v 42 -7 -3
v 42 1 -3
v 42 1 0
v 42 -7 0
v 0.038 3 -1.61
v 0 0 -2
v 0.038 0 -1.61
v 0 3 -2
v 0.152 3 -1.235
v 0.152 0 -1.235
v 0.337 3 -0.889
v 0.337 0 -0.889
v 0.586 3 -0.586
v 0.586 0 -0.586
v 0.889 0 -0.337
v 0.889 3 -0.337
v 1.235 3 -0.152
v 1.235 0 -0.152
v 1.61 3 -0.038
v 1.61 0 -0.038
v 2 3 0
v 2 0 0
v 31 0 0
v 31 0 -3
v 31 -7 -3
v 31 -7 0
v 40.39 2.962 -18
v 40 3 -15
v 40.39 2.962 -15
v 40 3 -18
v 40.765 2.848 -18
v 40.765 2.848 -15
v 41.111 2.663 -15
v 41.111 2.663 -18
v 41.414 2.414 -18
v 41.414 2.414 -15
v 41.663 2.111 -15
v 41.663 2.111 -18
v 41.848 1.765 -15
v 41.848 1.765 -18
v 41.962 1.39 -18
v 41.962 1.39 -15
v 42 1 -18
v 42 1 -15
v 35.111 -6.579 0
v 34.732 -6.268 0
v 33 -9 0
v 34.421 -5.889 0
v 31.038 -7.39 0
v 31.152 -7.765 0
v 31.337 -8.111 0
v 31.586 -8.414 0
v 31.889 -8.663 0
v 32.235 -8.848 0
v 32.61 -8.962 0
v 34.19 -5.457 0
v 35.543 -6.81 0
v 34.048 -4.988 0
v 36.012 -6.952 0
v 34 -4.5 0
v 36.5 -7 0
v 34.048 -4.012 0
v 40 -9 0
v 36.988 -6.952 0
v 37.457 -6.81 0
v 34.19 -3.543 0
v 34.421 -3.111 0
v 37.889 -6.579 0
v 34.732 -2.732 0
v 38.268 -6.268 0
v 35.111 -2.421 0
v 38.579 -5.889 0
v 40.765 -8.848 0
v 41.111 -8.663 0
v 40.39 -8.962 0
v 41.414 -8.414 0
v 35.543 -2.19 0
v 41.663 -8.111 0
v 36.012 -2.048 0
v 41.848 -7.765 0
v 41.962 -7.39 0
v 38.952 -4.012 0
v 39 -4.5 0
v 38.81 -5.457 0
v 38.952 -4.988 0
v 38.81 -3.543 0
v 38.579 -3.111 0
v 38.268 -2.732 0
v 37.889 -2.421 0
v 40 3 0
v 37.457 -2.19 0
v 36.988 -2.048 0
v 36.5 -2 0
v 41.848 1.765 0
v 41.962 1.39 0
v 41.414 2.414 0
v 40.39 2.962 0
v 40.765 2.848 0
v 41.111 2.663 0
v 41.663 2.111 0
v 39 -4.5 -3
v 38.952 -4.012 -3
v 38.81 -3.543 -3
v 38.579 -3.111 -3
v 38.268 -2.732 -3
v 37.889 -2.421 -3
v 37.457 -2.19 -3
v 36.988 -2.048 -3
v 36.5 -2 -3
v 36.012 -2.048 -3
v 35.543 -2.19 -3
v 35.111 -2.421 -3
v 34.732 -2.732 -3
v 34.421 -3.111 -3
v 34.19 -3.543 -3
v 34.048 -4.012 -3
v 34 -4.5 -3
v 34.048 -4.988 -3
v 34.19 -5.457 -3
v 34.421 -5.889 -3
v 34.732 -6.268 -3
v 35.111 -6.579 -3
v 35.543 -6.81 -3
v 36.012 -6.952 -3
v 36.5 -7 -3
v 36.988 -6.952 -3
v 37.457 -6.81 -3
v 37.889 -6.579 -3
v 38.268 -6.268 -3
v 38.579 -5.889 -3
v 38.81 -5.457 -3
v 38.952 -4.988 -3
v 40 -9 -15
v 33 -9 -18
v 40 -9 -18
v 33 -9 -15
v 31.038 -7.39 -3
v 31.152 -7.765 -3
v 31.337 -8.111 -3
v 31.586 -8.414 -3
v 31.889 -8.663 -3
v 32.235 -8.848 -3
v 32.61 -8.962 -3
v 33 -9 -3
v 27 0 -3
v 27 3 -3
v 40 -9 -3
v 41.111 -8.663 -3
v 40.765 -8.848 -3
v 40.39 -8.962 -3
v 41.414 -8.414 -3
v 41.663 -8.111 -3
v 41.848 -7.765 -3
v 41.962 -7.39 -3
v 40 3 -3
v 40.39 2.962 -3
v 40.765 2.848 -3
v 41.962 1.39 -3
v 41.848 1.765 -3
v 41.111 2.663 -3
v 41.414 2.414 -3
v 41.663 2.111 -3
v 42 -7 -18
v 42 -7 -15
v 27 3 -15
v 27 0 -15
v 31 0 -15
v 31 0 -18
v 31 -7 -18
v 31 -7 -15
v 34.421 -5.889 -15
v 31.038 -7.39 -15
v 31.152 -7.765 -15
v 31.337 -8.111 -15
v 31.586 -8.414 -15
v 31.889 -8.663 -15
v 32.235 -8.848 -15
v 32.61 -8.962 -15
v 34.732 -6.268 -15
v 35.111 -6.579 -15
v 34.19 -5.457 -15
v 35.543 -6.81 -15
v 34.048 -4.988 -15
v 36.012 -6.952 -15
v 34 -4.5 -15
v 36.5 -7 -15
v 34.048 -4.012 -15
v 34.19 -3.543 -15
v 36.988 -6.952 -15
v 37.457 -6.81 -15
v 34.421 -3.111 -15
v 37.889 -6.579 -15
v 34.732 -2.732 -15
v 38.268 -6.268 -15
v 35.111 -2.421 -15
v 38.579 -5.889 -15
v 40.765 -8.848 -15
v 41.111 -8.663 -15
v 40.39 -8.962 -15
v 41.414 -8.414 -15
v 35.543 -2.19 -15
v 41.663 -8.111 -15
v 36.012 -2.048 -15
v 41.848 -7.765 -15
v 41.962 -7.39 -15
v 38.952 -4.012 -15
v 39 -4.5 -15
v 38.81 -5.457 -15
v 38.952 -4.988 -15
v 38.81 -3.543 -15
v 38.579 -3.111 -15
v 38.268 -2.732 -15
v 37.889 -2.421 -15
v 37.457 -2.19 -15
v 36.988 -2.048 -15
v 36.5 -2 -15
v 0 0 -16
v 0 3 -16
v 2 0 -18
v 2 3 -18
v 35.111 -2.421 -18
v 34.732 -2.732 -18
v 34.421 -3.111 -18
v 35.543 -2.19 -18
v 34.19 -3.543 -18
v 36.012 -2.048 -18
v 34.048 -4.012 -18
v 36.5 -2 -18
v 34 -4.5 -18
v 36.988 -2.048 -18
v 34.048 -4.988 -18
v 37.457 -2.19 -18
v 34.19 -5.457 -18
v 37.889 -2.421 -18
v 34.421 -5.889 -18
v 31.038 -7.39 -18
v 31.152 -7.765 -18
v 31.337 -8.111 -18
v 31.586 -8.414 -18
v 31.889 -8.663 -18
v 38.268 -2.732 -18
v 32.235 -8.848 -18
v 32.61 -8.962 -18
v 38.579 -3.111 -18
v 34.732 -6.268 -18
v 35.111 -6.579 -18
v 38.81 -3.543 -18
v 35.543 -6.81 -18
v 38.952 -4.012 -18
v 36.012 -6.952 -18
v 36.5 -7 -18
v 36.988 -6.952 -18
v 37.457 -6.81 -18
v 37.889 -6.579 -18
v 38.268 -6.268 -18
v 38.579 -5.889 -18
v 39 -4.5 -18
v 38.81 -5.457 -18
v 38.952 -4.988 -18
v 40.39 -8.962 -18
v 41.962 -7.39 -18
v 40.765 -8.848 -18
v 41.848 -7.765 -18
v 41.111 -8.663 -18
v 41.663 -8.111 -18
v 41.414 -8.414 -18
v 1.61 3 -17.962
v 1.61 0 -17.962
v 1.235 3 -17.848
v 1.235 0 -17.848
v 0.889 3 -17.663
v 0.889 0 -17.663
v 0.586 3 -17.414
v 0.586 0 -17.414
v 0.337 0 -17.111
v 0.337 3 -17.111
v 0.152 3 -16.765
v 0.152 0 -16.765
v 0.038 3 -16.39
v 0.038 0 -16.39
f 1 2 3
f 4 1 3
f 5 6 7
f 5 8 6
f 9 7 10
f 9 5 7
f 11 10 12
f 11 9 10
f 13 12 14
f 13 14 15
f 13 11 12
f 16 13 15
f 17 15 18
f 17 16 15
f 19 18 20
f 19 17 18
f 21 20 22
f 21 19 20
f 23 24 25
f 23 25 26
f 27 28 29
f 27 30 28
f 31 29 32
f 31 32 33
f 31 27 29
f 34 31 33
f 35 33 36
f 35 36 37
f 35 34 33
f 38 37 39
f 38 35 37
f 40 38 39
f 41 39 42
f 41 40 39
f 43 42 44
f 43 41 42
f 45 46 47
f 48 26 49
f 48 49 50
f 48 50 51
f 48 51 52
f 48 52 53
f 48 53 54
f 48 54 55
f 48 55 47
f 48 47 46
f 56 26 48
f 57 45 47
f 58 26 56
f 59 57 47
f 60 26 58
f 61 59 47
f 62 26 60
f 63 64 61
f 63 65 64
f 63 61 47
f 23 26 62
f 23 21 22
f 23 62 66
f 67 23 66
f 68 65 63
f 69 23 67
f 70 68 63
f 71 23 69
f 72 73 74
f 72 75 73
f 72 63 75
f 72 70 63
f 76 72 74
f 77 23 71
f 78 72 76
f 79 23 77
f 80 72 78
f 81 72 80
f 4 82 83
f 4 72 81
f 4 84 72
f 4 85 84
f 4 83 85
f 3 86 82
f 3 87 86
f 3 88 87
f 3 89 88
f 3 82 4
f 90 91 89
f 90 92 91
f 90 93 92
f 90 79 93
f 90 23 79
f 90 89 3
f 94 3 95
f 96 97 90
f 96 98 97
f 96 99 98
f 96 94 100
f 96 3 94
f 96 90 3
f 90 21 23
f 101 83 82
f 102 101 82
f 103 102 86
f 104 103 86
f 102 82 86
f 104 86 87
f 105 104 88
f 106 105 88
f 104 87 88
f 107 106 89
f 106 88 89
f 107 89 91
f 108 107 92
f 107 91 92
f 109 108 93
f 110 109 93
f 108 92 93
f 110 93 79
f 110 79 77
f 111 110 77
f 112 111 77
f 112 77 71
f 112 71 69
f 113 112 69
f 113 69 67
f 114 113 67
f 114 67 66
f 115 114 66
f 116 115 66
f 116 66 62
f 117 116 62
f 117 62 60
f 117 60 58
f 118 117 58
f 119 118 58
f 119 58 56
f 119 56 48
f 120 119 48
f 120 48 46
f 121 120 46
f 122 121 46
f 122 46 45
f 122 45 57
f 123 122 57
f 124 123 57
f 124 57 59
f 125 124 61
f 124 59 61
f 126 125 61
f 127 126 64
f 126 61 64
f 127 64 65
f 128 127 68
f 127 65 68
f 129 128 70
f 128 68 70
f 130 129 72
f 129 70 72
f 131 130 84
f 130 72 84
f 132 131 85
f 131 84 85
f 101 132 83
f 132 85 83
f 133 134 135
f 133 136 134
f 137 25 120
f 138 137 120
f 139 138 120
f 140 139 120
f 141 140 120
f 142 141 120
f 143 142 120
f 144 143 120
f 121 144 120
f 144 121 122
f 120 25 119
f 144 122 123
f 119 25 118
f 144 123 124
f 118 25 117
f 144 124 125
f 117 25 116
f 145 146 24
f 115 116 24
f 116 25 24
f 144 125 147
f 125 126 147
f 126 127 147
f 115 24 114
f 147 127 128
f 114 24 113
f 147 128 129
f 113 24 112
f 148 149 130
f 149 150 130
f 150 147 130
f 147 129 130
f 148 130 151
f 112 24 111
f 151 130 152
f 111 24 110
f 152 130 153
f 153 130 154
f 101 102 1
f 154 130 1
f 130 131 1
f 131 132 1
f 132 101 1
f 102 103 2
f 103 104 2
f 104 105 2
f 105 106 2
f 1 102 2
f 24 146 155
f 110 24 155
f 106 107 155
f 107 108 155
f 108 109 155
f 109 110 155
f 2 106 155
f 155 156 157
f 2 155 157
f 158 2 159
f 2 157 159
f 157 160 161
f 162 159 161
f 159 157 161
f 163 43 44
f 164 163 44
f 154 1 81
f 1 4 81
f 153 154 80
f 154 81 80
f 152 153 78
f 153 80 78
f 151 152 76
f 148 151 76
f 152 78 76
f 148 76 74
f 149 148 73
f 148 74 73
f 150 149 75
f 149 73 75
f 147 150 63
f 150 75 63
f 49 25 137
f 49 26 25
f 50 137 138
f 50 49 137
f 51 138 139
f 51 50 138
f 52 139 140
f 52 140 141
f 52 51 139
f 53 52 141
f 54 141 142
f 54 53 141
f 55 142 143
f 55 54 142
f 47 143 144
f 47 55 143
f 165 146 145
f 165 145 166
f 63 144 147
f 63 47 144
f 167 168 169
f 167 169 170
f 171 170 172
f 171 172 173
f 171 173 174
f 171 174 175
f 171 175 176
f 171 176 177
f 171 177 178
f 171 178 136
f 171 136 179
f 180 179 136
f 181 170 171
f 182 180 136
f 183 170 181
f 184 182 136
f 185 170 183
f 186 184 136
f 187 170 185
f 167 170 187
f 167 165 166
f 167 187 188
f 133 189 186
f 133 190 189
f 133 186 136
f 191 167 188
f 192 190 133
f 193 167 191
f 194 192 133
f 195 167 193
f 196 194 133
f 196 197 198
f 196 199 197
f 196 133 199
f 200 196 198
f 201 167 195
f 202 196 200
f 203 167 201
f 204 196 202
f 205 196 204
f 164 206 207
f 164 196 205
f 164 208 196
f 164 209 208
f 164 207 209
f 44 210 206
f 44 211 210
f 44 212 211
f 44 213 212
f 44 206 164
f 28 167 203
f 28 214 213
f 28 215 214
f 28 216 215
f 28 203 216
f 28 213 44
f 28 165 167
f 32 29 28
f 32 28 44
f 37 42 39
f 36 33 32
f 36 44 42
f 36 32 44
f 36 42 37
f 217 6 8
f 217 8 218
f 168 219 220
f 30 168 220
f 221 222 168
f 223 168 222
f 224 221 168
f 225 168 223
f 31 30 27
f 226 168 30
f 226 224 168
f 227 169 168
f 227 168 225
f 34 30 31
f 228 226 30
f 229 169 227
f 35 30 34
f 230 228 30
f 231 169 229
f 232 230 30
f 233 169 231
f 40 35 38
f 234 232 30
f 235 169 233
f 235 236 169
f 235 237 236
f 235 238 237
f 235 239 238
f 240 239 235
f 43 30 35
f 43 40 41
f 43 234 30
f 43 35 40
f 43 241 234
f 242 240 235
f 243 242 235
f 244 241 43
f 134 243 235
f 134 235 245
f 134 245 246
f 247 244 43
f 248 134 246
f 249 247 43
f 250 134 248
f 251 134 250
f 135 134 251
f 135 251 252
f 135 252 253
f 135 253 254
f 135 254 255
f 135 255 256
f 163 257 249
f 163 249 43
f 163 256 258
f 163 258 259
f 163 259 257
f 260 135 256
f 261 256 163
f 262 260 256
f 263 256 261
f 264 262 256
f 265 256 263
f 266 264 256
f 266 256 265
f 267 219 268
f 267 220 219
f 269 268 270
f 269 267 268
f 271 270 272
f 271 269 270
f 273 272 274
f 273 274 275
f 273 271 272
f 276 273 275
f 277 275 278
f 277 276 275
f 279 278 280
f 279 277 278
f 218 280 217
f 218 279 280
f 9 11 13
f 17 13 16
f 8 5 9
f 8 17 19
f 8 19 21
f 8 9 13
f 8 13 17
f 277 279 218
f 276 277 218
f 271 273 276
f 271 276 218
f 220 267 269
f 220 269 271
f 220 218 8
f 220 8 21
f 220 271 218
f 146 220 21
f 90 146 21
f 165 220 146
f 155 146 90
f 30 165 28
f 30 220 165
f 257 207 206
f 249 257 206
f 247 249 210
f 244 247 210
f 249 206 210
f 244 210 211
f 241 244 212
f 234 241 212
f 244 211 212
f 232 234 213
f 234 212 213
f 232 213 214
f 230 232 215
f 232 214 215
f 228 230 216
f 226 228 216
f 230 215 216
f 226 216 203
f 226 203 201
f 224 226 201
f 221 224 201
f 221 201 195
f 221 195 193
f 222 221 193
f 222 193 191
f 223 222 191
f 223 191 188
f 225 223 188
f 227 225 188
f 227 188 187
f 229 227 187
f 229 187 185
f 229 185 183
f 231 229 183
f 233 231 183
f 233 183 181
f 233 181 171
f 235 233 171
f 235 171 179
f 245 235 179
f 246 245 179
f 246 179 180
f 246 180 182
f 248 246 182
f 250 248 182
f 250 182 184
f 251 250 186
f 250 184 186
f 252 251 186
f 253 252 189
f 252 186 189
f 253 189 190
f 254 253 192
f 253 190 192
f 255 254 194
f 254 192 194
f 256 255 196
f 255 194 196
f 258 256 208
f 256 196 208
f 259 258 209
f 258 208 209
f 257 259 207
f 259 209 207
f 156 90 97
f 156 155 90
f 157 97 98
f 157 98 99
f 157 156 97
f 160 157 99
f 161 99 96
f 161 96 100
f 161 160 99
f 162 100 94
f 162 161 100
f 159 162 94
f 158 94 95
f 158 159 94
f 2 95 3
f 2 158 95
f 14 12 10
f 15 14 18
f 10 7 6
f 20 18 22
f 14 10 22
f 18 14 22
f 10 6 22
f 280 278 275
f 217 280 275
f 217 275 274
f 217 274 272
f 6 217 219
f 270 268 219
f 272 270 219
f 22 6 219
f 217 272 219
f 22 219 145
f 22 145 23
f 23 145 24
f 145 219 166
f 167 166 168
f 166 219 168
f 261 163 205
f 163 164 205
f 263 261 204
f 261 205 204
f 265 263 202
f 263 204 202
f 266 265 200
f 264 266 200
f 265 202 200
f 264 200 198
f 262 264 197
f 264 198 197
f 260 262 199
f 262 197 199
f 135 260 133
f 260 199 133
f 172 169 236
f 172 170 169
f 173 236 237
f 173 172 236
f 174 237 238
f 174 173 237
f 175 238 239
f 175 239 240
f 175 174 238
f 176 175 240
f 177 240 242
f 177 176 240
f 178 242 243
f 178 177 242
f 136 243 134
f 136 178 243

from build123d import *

# Parameters (mm, degrees)
SKETCH1_W           = 42
SKETCH1_H           = 18
BOSS_EXTRUDE1_DEPTH = 3
SKETCH2_W           = 11
SKETCH2_H           = 3
BOSS_EXTRUDE2_DEPTH = 9
SKETCH3_R           = 2.5
CUT_EXTRUDE1_DEPTH  = 47.572524089
SKETCH4_W           = 15
SKETCH4_H           = 12
CUT_EXTRUDE2_DEPTH  = 3
FILLET1_R           = 2
FILLET2_R           = 2


with BuildPart() as part:
    # Sketch1 → Boss-Extrude1 (new body)
    with BuildSketch(Plane(origin=(0, 0, 0), x_dir=(1, 0, 0), z_dir=(0, 1, 0))):
        with Locations((21, 9)):
            Rectangle(SKETCH1_W, SKETCH1_H)
    extrude(amount=BOSS_EXTRUDE1_DEPTH)

    # Sketch2 → Boss-Extrude2 (add)
    with BuildSketch(Plane.XZ):
        with Locations((36.5, -1.5)):
            Rectangle(SKETCH2_W, SKETCH2_H)
        with Locations((36.5, -16.5)):
            Rectangle(SKETCH2_W, SKETCH2_H)
    extrude(amount=BOSS_EXTRUDE2_DEPTH)

    # Sketch3 → Cut-Extrude1 (cut, through all)
    with BuildSketch(Plane.XY):
        with Locations((36.5, -4.5)):
            Circle(SKETCH3_R)
    extrude(amount=-CUT_EXTRUDE1_DEPTH, mode=Mode.SUBTRACT)

    # Sketch4 → Cut-Extrude2 (cut)
    with BuildSketch(Plane(origin=(0, 3, 0), x_dir=(1, 0, 0), z_dir=(0, 1, 0))):
        with Locations((34.5, 9)):
            Rectangle(SKETCH4_W, SKETCH4_H)
    extrude(amount=-CUT_EXTRUDE2_DEPTH, mode=Mode.SUBTRACT)

    # Fillet1
    fillet1_edges = [part.edges().sort_by_distance(p)[0] for p in [
        (0, 1.5, -18),
        (0, 1.5, 0),
    ]]
    fillet(fillet1_edges, radius=FILLET1_R)

    # Fillet2
    fillet2_edges = [part.edges().sort_by_distance(p)[0] for p in [
        (42, 3, -1.5),
        (42, -9, -1.5),
        (31, -9, -1.5),
        (42, -9, -16.5),
        (31, -9, -16.5),
        (42, 3, -16.5),
    ]]
    fillet(fillet2_edges, radius=FILLET2_R)


solid = part.part
